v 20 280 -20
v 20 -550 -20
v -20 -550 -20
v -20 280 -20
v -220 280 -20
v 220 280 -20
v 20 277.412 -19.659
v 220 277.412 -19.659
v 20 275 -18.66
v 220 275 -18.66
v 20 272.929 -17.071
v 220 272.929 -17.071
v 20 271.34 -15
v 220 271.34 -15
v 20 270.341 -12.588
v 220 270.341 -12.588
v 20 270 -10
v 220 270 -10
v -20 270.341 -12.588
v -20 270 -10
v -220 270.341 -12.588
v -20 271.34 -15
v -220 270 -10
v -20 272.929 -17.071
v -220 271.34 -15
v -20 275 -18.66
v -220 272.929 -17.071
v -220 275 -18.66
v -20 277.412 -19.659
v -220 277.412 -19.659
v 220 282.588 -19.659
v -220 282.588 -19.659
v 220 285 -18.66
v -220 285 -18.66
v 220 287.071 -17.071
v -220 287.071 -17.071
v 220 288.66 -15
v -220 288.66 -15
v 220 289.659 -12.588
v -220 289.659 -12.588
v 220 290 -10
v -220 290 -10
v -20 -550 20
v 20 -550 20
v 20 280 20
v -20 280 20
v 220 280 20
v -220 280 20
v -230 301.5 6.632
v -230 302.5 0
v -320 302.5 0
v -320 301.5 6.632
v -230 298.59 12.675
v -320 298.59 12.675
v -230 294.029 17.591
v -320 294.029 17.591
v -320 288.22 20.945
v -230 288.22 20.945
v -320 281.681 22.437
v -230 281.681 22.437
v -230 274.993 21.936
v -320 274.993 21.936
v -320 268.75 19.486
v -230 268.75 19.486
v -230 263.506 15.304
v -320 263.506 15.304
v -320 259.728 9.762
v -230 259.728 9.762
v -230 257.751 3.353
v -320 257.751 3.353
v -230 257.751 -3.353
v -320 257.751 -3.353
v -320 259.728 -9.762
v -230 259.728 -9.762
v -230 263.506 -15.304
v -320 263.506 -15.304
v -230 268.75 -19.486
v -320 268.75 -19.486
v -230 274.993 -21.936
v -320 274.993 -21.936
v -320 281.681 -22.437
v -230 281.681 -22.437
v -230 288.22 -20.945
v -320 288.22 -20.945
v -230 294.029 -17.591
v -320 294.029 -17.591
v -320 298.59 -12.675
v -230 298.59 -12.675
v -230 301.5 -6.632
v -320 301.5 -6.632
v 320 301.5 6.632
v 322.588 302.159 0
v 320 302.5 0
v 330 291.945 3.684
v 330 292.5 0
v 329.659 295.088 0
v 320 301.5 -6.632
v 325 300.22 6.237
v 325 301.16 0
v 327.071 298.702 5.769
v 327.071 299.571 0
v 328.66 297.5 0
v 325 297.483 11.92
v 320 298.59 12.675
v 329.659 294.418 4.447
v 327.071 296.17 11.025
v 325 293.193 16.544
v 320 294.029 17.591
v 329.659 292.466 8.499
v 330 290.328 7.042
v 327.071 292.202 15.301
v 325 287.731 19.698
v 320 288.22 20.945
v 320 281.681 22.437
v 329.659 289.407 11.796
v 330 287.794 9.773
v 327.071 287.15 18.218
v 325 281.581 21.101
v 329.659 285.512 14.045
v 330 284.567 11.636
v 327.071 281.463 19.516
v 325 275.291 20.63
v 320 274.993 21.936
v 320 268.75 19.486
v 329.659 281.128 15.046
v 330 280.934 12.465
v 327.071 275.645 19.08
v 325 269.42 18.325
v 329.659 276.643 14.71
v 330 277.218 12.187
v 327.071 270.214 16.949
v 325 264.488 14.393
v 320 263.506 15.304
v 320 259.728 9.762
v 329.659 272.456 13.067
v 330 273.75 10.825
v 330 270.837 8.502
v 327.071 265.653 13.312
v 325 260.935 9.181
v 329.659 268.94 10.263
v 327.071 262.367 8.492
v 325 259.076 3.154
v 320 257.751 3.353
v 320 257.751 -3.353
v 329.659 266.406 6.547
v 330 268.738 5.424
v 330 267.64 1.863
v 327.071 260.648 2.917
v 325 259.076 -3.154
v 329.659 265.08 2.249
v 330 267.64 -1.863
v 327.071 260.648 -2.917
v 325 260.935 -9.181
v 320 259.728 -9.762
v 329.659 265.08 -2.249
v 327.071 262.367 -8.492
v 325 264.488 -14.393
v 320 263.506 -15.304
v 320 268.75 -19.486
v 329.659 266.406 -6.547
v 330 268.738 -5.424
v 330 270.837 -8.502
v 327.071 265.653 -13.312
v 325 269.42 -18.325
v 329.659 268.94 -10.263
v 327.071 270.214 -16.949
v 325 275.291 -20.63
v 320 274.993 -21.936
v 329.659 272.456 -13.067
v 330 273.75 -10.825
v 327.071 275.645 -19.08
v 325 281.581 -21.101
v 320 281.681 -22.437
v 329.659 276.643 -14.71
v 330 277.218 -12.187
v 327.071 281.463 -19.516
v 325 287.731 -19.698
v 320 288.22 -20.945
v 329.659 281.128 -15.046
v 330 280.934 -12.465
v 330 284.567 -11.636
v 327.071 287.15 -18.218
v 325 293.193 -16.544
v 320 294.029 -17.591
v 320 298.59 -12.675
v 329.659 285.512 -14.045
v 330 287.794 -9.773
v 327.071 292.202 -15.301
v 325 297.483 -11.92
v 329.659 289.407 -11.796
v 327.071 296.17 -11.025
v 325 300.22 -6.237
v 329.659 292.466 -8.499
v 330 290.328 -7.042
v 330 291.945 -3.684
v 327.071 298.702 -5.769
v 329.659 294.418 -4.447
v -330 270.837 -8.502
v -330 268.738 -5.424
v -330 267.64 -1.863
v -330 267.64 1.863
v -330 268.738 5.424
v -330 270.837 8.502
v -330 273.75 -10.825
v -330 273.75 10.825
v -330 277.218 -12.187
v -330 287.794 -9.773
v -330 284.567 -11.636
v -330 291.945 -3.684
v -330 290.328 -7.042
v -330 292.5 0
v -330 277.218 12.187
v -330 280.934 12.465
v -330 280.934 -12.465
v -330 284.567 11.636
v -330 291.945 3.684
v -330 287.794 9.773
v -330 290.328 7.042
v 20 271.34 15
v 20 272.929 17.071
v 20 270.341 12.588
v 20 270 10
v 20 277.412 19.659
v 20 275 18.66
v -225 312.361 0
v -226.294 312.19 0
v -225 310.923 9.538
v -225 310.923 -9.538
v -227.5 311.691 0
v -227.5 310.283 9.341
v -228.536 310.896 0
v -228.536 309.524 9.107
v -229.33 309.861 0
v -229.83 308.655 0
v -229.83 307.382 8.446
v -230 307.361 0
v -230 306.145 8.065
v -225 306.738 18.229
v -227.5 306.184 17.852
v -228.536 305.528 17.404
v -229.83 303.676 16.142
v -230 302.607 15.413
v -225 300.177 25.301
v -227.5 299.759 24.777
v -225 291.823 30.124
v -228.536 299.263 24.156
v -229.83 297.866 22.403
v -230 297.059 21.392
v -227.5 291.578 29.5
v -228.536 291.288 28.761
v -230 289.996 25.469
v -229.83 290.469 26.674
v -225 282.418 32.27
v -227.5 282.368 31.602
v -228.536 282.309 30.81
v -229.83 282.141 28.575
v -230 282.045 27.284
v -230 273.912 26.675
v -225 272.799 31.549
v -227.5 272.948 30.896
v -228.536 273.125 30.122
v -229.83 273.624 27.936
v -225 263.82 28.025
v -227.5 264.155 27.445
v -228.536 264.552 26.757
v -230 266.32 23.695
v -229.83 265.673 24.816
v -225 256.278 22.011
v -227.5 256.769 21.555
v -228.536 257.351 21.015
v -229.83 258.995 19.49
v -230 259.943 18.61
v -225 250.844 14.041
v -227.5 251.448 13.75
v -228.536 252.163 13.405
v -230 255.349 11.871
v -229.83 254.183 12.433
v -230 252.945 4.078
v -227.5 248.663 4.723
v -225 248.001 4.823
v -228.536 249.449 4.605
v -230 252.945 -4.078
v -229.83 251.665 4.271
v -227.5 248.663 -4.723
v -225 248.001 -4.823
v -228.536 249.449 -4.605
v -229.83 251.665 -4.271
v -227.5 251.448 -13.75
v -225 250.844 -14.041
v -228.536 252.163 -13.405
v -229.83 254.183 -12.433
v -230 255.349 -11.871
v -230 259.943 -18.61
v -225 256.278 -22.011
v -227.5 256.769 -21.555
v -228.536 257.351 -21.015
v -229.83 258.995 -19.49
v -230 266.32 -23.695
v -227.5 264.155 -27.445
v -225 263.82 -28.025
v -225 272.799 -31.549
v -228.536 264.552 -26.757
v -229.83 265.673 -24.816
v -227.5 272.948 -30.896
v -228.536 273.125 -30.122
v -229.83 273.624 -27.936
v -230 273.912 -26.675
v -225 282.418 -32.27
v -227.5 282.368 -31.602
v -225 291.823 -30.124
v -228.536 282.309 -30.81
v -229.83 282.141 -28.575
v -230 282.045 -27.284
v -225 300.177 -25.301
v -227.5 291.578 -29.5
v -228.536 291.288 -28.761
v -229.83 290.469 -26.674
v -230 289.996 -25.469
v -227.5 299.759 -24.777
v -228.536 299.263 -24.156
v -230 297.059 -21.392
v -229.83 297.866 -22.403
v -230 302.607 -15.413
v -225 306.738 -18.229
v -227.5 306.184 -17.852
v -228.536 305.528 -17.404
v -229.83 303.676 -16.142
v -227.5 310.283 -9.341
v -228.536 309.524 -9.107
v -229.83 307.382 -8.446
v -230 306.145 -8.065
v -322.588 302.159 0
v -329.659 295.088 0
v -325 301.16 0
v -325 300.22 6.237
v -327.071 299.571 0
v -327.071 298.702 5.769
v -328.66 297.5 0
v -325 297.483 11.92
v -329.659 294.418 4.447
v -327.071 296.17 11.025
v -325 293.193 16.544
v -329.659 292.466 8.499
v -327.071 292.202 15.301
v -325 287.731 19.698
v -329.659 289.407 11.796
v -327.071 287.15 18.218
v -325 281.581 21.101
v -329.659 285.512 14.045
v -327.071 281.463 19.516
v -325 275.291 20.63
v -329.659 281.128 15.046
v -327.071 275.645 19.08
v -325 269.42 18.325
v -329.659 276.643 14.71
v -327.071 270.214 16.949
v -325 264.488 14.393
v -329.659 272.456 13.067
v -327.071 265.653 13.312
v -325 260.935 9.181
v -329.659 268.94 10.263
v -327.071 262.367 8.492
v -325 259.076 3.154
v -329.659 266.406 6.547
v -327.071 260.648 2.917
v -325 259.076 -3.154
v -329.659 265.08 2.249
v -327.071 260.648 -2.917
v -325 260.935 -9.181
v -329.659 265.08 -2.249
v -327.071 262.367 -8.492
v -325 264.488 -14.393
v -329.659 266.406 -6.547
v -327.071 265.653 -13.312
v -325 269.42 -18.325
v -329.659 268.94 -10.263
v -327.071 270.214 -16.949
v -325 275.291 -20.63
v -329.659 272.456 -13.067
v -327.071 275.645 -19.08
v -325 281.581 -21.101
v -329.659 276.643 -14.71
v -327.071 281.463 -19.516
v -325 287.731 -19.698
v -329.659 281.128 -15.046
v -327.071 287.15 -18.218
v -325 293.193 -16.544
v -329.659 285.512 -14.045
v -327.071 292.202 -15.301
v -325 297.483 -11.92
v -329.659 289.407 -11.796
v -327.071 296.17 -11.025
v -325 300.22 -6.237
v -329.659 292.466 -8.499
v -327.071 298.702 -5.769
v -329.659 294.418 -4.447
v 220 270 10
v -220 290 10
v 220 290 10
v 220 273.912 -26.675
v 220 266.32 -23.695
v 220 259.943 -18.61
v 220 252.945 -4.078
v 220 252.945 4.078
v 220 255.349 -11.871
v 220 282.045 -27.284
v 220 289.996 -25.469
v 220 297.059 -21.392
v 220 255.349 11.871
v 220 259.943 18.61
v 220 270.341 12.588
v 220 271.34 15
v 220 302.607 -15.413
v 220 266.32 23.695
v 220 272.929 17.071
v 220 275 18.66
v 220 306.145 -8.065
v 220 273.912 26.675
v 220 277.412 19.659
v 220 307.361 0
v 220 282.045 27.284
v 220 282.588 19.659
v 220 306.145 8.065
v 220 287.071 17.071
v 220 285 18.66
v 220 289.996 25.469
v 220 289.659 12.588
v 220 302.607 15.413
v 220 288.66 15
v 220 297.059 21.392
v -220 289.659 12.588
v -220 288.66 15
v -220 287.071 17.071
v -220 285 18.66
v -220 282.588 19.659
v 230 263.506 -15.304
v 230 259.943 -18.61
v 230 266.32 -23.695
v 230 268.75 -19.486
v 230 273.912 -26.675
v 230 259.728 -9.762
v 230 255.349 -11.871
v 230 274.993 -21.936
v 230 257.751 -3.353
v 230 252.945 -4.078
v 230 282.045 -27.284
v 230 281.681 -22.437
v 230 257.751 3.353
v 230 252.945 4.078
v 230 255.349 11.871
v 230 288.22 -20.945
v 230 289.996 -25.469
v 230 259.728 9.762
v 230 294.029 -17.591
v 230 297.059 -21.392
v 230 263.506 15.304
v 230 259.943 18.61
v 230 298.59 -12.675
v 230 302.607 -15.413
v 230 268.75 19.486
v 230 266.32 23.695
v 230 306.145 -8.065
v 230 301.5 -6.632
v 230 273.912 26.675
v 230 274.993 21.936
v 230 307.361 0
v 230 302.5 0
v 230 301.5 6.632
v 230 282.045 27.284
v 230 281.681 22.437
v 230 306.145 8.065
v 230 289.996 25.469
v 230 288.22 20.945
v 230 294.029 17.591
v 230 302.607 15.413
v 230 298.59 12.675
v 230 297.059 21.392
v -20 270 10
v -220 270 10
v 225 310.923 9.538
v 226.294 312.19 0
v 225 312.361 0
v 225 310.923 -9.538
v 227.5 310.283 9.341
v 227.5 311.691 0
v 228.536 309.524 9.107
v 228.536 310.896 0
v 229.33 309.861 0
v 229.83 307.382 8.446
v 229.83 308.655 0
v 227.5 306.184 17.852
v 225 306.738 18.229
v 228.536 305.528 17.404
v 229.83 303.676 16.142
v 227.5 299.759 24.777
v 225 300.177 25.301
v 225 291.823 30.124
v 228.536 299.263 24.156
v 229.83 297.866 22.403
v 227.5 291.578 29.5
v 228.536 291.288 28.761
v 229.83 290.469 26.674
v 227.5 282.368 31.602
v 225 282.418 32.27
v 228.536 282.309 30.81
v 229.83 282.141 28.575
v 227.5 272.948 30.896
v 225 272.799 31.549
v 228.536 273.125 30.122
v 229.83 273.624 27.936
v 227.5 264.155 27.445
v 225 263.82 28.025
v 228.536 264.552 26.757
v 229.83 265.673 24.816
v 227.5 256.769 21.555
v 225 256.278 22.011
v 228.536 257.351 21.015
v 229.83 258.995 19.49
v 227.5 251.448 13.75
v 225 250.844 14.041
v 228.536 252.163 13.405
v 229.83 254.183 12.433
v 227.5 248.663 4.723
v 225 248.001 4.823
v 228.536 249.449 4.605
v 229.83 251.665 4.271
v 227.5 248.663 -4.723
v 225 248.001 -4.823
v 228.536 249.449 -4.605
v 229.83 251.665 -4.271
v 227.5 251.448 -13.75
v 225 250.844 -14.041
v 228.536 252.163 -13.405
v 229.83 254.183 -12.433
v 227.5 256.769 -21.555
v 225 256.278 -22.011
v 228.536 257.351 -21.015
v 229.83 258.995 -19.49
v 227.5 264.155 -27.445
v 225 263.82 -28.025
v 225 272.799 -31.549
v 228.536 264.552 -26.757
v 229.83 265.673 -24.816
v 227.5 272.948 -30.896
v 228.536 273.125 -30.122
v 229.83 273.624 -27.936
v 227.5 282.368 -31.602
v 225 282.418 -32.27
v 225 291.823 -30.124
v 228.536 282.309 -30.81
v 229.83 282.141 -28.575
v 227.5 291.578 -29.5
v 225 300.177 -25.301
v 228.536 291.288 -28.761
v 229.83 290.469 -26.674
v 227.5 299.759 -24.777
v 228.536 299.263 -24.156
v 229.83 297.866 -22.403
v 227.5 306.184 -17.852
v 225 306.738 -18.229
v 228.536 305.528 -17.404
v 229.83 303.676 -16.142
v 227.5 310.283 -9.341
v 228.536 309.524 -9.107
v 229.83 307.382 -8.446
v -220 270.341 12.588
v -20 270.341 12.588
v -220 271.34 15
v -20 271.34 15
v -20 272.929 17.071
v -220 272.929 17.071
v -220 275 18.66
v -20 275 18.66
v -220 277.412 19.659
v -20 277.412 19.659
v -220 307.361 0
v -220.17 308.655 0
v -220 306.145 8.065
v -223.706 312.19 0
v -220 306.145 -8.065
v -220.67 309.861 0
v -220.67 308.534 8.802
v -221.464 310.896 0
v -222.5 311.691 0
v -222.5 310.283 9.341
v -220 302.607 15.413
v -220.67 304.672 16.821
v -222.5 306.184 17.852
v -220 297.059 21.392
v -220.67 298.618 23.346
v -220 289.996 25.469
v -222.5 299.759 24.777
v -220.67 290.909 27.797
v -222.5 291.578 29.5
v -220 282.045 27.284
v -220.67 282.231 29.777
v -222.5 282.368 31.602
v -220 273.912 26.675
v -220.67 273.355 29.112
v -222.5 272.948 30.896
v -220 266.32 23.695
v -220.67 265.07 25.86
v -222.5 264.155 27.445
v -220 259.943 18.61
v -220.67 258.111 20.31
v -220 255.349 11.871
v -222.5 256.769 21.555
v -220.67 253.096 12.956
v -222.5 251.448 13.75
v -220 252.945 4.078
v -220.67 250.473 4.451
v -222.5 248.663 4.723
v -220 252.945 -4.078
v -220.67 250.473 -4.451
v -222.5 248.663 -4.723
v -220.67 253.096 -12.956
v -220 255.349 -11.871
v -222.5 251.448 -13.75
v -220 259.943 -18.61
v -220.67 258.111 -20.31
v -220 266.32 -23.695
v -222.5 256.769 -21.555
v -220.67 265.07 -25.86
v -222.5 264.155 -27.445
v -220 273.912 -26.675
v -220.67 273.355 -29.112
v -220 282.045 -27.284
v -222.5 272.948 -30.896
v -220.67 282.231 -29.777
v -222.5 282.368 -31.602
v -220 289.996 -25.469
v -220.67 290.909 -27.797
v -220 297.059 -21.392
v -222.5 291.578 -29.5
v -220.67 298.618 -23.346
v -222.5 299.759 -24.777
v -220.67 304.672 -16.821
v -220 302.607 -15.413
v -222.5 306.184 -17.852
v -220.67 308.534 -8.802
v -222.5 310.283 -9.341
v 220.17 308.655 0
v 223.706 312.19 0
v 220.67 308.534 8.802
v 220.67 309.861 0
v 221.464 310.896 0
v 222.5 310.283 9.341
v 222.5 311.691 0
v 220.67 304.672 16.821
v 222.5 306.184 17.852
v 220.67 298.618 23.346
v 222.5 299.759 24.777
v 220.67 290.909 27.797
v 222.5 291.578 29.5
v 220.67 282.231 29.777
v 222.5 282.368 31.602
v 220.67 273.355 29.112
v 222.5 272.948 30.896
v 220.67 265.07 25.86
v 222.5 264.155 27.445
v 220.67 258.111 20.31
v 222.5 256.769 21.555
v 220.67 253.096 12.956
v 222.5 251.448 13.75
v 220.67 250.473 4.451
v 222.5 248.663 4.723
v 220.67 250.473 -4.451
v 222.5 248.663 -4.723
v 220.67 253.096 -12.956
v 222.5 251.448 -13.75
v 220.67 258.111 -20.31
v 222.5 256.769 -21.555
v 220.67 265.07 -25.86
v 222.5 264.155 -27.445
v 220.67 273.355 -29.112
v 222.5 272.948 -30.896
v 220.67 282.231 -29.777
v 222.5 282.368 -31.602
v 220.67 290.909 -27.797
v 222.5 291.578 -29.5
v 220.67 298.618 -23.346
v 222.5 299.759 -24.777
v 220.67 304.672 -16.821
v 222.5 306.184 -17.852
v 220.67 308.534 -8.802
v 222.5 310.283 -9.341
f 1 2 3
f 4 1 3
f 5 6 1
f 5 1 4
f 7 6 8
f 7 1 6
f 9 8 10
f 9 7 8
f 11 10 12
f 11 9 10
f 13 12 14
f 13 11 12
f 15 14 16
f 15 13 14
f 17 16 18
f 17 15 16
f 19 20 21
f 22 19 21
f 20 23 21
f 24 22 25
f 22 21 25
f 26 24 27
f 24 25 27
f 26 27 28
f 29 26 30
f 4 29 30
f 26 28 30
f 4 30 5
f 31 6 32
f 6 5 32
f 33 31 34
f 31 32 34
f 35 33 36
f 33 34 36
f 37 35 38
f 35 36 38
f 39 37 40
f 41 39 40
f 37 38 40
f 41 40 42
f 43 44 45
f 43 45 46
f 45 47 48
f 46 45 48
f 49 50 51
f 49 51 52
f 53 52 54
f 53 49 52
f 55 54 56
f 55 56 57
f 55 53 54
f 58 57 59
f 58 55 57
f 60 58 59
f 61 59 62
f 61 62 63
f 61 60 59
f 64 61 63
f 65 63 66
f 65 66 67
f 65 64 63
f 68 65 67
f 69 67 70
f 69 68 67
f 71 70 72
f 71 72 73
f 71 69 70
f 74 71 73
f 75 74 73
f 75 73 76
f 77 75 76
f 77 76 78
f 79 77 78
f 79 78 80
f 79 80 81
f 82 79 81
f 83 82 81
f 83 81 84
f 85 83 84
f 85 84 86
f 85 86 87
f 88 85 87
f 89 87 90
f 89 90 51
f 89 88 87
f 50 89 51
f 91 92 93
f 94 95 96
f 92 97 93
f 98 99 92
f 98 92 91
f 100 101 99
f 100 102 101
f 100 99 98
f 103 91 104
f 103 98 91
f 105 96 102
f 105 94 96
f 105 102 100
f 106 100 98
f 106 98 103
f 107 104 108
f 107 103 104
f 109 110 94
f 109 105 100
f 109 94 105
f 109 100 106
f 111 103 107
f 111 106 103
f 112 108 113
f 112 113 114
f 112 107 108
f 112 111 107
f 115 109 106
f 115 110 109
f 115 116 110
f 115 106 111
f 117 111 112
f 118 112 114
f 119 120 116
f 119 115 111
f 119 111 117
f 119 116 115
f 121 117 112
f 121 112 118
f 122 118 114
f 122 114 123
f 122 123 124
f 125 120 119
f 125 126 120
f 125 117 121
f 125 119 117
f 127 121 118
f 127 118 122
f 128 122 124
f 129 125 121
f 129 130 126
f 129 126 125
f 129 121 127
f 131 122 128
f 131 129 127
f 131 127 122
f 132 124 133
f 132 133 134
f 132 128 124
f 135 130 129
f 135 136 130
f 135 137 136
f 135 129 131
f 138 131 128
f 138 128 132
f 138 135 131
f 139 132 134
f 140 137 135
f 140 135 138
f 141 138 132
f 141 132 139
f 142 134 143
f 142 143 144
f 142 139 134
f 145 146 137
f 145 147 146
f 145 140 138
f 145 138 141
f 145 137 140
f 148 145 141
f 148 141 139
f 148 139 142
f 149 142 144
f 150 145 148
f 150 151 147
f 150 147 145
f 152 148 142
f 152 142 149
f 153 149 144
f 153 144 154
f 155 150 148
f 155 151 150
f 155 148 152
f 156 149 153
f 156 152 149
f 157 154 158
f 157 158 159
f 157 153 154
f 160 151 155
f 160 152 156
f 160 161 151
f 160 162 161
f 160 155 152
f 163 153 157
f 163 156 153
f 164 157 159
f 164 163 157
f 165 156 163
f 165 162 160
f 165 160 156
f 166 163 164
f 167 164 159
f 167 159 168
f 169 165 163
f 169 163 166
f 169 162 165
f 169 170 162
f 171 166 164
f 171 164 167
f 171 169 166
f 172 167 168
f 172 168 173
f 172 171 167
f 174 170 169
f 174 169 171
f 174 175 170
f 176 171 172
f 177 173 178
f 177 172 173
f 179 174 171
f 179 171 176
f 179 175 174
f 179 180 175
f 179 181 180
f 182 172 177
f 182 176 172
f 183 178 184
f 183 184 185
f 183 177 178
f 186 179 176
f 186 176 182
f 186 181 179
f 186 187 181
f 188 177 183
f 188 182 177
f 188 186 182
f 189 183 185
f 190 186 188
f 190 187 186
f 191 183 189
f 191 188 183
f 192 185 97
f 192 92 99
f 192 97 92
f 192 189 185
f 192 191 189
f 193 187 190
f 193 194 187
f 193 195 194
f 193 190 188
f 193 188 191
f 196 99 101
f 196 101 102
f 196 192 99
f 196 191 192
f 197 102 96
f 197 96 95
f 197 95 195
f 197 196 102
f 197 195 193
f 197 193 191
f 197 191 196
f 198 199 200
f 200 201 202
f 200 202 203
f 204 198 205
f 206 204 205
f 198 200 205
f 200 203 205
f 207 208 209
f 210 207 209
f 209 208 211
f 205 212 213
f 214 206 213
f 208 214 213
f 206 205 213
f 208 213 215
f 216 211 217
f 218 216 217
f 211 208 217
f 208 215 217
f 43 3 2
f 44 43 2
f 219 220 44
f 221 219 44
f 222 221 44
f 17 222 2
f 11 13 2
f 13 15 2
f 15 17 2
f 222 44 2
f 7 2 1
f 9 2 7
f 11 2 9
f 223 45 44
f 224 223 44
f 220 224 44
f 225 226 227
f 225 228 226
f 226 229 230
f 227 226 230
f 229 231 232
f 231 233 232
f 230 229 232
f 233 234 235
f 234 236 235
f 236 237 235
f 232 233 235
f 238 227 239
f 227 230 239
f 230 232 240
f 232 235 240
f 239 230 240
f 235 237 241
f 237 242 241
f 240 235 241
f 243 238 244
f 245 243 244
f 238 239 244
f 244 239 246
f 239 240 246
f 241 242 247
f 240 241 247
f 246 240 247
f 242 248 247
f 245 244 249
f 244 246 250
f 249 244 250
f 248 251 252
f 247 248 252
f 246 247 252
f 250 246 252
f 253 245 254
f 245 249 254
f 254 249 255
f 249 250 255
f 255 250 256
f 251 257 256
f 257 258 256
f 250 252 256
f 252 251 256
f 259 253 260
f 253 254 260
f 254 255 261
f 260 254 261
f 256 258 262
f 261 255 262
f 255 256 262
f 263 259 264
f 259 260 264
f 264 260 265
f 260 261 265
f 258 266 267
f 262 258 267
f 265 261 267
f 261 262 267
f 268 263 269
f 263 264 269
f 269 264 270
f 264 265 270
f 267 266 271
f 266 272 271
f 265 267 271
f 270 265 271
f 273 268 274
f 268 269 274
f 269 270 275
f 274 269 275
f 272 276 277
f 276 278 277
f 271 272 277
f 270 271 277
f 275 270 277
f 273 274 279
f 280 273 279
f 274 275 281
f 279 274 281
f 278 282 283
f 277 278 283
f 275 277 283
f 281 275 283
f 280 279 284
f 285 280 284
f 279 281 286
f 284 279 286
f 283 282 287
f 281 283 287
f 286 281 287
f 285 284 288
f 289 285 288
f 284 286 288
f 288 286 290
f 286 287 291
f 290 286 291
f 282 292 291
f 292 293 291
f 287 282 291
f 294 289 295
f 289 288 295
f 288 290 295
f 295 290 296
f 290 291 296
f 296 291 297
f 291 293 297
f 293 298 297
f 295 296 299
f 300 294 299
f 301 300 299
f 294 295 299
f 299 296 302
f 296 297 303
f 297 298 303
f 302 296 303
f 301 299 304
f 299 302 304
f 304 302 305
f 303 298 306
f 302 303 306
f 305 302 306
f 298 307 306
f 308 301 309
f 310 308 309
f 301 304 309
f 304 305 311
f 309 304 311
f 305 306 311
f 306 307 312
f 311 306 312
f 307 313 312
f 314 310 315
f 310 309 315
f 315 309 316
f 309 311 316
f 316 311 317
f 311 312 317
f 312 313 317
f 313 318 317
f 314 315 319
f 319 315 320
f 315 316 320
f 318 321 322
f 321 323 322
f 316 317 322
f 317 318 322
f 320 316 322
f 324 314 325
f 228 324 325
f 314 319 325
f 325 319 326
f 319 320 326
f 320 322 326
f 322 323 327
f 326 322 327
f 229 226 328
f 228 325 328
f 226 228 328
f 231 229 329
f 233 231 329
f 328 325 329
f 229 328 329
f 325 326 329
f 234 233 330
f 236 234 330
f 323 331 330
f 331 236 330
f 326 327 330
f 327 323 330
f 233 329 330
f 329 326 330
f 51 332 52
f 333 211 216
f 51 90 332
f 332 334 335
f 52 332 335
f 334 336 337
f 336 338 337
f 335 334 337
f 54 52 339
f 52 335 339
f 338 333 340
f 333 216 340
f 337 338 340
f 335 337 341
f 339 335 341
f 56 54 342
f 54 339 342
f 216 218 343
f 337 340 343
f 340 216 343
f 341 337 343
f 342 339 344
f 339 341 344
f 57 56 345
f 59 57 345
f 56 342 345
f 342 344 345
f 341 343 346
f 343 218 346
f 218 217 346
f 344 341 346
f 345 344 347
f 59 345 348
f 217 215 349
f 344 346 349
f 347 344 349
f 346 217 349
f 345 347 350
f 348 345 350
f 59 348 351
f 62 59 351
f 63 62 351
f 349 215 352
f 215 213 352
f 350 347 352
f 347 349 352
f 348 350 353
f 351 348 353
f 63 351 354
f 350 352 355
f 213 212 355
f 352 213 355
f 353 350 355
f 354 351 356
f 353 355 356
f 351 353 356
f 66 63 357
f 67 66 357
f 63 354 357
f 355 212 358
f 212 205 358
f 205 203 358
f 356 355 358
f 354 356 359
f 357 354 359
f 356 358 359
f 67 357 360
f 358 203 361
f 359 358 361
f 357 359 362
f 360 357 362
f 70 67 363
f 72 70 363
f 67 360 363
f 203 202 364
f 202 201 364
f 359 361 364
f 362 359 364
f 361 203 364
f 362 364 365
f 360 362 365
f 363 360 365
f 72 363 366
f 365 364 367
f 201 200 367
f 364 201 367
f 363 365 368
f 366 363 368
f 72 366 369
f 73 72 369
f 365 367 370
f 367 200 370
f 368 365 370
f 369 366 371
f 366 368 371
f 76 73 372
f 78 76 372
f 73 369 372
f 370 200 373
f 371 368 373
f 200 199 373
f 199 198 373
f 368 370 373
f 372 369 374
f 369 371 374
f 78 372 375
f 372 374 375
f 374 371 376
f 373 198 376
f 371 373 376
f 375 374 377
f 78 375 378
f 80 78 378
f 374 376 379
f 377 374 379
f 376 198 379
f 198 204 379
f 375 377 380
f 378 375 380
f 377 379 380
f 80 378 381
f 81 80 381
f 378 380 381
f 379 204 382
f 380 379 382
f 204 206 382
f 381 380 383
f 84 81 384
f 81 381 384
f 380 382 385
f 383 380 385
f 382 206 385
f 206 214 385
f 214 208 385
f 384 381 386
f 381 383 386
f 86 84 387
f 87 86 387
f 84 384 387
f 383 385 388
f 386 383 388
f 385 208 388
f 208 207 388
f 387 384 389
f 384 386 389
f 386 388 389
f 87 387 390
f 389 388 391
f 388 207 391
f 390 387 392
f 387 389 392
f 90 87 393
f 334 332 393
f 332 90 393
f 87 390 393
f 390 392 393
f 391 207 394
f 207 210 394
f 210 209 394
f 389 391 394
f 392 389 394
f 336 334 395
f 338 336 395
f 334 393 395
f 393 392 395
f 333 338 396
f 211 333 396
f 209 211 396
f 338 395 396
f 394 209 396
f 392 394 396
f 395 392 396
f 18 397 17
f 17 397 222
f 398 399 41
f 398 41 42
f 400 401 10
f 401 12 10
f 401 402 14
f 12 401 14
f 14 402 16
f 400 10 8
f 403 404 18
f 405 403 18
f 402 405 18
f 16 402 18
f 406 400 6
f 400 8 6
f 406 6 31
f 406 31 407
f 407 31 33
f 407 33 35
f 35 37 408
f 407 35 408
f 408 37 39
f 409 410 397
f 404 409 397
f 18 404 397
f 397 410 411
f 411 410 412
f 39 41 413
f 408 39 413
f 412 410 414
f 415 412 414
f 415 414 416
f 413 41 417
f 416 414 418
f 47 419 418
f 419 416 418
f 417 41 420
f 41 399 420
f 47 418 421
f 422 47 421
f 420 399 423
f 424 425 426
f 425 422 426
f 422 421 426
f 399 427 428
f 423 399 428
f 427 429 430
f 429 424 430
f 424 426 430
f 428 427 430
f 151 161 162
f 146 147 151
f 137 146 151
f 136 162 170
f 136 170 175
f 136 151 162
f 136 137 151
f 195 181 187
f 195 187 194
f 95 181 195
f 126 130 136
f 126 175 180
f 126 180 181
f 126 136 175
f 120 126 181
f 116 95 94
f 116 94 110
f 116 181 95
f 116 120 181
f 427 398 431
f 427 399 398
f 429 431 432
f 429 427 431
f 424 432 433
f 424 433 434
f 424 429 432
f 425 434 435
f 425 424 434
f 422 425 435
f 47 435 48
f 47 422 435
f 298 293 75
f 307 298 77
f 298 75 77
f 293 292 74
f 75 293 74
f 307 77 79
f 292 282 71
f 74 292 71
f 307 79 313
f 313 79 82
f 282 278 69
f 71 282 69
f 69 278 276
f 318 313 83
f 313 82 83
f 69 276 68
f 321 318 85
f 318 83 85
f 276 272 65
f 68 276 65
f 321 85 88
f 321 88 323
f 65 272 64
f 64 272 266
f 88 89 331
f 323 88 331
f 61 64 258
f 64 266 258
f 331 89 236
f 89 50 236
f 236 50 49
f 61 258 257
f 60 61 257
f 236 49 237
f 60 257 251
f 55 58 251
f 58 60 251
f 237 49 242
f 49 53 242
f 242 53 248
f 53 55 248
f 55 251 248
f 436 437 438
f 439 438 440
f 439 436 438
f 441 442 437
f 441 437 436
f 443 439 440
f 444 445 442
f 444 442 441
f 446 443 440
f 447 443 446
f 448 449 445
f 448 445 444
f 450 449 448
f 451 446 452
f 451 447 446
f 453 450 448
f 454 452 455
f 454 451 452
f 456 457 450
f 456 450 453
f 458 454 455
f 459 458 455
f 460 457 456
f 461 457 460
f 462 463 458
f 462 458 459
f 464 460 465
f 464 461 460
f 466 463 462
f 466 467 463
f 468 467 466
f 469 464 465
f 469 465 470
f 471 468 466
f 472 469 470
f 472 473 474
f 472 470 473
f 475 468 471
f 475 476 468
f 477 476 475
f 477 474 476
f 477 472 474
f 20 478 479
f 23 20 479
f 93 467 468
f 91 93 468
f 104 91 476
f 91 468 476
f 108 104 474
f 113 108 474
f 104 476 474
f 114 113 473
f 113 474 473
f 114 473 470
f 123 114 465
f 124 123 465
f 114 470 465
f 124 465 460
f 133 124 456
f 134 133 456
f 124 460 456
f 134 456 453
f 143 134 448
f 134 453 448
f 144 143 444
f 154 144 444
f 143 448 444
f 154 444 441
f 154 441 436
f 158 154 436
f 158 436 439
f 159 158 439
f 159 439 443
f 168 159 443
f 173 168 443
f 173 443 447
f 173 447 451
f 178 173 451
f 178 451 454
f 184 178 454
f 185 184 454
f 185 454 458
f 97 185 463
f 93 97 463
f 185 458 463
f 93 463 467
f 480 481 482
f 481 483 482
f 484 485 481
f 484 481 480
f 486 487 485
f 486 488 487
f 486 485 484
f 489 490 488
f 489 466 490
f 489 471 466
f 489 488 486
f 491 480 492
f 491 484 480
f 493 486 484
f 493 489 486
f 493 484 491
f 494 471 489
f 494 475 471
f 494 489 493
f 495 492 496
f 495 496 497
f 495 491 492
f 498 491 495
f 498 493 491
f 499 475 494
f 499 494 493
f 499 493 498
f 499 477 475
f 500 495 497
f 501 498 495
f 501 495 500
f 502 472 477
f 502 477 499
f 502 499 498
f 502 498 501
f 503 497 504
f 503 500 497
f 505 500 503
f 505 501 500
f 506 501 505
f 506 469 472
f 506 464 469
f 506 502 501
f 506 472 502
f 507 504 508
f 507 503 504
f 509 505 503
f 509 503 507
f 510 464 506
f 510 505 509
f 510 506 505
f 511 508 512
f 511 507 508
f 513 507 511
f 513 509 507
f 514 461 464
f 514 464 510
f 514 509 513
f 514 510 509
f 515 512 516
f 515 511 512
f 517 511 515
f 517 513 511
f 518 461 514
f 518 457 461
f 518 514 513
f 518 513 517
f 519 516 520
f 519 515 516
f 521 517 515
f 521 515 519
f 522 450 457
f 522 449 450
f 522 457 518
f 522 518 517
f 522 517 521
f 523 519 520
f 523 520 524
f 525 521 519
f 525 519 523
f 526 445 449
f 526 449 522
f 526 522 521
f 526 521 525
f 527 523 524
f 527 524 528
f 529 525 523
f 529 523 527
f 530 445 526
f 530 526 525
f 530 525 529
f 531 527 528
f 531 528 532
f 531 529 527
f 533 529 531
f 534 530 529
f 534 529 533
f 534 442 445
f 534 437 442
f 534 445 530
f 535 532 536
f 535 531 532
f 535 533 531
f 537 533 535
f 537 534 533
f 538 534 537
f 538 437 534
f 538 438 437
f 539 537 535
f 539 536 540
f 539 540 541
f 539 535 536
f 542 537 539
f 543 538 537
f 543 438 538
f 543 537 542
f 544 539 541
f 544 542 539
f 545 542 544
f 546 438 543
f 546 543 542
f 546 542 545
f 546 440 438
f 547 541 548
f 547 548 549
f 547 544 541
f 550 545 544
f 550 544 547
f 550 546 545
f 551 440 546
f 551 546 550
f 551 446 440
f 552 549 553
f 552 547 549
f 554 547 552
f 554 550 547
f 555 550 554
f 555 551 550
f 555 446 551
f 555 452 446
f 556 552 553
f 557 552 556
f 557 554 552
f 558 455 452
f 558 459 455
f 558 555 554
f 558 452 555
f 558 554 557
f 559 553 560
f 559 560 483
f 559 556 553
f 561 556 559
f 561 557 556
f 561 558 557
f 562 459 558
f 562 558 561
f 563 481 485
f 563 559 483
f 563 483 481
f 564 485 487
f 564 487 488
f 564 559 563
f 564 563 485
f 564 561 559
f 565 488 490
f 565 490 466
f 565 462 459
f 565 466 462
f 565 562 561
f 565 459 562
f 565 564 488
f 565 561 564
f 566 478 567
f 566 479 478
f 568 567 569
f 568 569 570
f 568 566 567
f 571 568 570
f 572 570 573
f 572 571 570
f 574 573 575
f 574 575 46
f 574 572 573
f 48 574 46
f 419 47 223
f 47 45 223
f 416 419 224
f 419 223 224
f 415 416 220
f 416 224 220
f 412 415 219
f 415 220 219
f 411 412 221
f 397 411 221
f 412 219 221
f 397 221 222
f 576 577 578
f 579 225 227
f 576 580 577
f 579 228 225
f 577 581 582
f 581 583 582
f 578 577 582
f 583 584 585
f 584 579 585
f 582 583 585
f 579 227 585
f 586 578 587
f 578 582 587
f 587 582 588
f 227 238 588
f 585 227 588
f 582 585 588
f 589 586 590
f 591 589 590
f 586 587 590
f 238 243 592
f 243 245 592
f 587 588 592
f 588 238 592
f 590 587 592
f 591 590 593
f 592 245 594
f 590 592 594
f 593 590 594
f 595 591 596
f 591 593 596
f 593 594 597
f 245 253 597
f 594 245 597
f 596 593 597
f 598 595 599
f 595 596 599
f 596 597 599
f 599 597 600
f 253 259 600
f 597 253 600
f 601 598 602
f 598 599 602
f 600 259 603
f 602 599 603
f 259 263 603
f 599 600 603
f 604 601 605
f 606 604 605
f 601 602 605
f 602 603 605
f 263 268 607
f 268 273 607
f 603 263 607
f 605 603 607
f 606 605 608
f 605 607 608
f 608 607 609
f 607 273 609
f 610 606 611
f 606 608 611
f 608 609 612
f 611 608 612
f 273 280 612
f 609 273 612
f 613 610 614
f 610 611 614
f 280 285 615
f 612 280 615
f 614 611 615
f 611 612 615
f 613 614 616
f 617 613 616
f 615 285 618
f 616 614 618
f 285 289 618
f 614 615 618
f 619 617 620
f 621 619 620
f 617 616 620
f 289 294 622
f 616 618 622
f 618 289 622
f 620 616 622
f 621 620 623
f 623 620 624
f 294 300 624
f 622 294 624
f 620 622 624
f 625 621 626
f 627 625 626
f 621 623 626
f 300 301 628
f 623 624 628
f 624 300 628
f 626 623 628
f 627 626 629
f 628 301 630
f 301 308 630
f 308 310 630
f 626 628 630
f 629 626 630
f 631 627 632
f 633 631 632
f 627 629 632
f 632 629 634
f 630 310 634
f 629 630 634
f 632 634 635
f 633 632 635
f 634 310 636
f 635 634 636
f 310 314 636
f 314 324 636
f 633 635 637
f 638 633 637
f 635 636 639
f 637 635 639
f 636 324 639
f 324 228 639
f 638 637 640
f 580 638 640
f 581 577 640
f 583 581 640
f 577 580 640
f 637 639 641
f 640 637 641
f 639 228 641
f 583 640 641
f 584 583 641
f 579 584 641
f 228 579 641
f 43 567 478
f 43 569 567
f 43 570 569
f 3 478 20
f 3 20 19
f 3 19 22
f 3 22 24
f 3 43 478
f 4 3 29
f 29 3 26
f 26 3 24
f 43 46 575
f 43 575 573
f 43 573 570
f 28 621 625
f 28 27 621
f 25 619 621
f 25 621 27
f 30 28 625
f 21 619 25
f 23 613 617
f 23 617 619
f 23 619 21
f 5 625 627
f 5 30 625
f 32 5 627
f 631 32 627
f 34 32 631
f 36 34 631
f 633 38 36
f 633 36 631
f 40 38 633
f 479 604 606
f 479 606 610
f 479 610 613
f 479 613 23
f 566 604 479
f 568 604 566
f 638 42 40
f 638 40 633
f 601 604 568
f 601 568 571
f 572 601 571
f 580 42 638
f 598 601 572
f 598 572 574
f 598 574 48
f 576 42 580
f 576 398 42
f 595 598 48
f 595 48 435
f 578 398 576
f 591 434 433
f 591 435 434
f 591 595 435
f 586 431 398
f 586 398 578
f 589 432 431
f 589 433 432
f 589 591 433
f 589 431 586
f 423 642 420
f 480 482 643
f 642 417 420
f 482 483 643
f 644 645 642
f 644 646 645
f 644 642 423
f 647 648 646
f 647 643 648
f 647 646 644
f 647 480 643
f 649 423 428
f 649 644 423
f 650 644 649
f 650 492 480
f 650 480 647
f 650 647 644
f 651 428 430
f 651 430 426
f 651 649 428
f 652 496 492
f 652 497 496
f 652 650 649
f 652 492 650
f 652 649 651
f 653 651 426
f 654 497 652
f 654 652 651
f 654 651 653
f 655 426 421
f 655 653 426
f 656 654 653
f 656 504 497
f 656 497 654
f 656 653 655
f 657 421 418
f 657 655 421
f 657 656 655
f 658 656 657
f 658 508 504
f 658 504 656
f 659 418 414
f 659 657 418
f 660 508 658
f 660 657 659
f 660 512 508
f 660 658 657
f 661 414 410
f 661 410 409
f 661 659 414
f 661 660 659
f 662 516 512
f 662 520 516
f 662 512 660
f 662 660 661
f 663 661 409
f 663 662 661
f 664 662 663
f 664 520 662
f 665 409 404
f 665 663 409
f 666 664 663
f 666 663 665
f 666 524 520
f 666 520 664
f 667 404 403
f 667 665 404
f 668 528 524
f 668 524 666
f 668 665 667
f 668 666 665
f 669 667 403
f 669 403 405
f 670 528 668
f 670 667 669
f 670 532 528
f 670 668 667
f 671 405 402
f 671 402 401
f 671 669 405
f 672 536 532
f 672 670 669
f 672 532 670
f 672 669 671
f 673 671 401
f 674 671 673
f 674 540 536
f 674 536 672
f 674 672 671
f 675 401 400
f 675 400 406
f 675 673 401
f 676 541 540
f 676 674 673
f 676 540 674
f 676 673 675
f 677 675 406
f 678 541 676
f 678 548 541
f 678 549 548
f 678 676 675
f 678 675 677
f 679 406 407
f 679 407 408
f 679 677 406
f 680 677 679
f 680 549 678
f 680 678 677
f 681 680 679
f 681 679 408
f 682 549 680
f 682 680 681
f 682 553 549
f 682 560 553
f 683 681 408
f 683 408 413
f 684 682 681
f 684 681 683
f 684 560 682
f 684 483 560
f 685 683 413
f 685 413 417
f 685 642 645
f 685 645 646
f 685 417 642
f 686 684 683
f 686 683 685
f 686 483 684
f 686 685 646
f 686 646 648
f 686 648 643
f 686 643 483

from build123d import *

# Parameters (mm, degrees)
BOSS_EXTRUDE1_DEPTH      = 290
BOSS_EXTRUDE1_DEPTH_BACK = 550
SKETCH1_W                = 40
SKETCH1_H                = 40
BOSS_EXTRUDE2_DEPTH      = 40
SKETCH3_R                = 32.360679775
BOSS_EXTRUDE3_DEPTH      = 10
SKETCH4_R                = 22.5
BOSS_EXTRUDE4_DEPTH      = 100
FILLET1_R                = 10
FILLET2_R                = 5
FILLET3_R                = 5
FILLET4_R                = 10


with BuildPart() as part:
    # Sketch1 → Boss-Extrude1 (new, two sides: drawn at the far end of the back side and taken through both)
    with BuildSketch(Plane(origin=(0, 0, 0), x_dir=(1, 0, 0), z_dir=(0, 1, 0)).offset(-BOSS_EXTRUDE1_DEPTH_BACK)):
        Rectangle(SKETCH1_W, SKETCH1_H)
    extrude(amount=BOSS_EXTRUDE1_DEPTH + BOSS_EXTRUDE1_DEPTH_BACK)

    # Sketch2 → Boss-Extrude2 (add)
    with BuildSketch(Plane.XY.offset(20)):
        Polygon((20, 290), (220, 290), (220, 270), (-220, 270), (-220, 290), (-20, 290), align=None)
    extrude(amount=-BOSS_EXTRUDE2_DEPTH)

    # Sketch3 → Boss-Extrude3 (add)
    with BuildSketch(Plane(origin=(220, 0, 0), x_dir=(0, 0, -1), z_dir=(1, 0, 0))):
        with Locations(Location((0, 280, 0), (0, 0, 90))):
            Circle(SKETCH3_R)
    boss_extrude3 = extrude(amount=BOSS_EXTRUDE3_DEPTH)

    # Sketch4 → Boss-Extrude4 (add)
    with BuildSketch(Plane(origin=(230, 0, 0), x_dir=(0, 0, -1), z_dir=(1, 0, 0))):
        with Locations(Location((0, 280, 0), (0, 0, 90))):
            Circle(SKETCH4_R)
    boss_extrude4 = extrude(amount=BOSS_EXTRUDE4_DEPTH)

    # Mirror1: Boss-Extrude3, Boss-Extrude4 across plane
    add(boss_extrude3.mirror(Plane(origin=(0, 0, 0), x_dir=(0, 0, 1), z_dir=(1, 0, 0))))
    add(boss_extrude4.mirror(Plane(origin=(0, 0, 0), x_dir=(0, 0, 1), z_dir=(1, 0, 0))))

    # Fillet1
    fillet1_edges = [part.edges().sort_by_distance(p)[0] for p in [
        (-120, 270, 20),
        (-120, 270, -20),
        (120, 270, 20),
        (120, 270, -20),
        (0, 290, -20),
        (0, 290, 20),
    ]]
    fillet(fillet1_edges, radius=FILLET1_R - 0.0001)  # a hair under: the kernel refuses the full size

    # Fillet2
    fillet2_edges = [part.edges().sort_by_distance(p)[0] for p in [
        (220, 247.639320225, 0),
        (230, 247.639320225, 0),
    ]]
    fillet(fillet2_edges, radius=FILLET2_R - 0.0001)  # a hair under: the kernel refuses the full size

    # Fillet3
    fillet3_edges = [part.edges().sort_by_distance(p)[0] for p in [
        (-230, 247.639320225, 0),
        (-220, 247.639320225, 0),
    ]]
    fillet(fillet3_edges, radius=FILLET3_R - 0.0001)  # a hair under: the kernel refuses the full size

    # Fillet4
    fillet4_edges = [part.edges().sort_by_distance(p)[0] for p in [
        (330, 257.5, 0),
        (-330, 257.5, 0),
    ]]
    fillet(fillet4_edges, radius=FILLET4_R)


solid = part.part
